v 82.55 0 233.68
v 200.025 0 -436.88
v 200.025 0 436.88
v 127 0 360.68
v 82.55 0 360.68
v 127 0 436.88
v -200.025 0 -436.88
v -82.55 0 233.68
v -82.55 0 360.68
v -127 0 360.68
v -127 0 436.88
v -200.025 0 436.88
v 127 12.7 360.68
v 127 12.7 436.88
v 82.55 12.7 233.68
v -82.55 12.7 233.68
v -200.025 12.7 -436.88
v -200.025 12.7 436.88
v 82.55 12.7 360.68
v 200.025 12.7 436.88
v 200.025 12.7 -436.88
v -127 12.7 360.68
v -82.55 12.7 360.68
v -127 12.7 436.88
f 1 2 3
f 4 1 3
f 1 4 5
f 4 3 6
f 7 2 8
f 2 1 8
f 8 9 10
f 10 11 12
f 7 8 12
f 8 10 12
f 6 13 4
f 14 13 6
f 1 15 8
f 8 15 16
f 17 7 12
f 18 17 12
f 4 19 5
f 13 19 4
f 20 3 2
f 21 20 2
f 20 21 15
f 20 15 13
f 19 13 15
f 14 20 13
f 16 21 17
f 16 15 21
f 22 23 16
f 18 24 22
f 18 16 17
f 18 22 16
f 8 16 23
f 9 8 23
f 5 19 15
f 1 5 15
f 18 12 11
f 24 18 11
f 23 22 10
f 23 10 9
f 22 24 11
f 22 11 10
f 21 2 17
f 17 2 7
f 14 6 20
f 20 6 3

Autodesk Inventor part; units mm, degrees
ref_plane "YZ Plane" through (0, 0, 0) normal (1, 0, 0) x (0, 1, 0)
ref_plane "XZ Plane" through (0, 0, 0) normal (0, 1, 0) x (-1, 0, 0)
ref_plane "XY Plane" through (0, 0, 0) normal (0, 0, 1) x (1, 0, 0)
sketch "Sketch1" plane through (0, 0, 0) normal (0, 1, 0) x (-1, 0, 0)
  line L0 (200.025, 436.88) -> (-200.025, 436.88)
  line L1 (-200.025, 436.88) -> (-200.025, -436.88)
  line L2 (-200.025, -436.88) -> (200.025, -436.88)
  line L3 (200.025, -436.88) -> (200.025, 436.88)
  line L4 (200.025, 436.88) -> (-200.025, -436.88) construction
  line L5 (-200.025, 436.88) -> (200.025, -436.88) construction
  point P0 (0, 0)
  dimension "d0" = 400.05
  dimension "d1" = 873.76
extrude "Extrusion1" add sketch "Sketch1" along normal blind 12.7
sketch "Sketch4" plane through (0, 12.7, 0) normal (0, 1, 0) x (1, 0, 0)
  line L0 (-82.55, -436.88) -> (82.55, -436.88)
  line L1 (82.55, -436.88) -> (82.55, -233.68)
  line L2 (82.55, -233.68) -> (-82.55, -233.68)
  line L3 (-82.55, -233.68) -> (-82.55, -436.88)
  line L4 (-82.55, -436.88) -> (82.55, -233.68) construction
  line L5 (82.55, -436.88) -> (-82.55, -233.68) construction
  line L6 (-200.025, -436.88) -> (200.025, -436.88) projected
  line L7 (-200.025, 436.88) -> (-200.025, -436.88) projected
  line L8 (200.025, -436.88) -> (200.025, 436.88) projected
  point P0 (0, 0)
  point P1 (0, -335.28)
  dimension "d11" = 0
  dimension "d12" = 165.1
  dimension "d13" = 203.2
  dimension "d19" = 117.475
  dimension "d20" = 117.475
extrude "Extrusion2" cut sketch "Sketch4" against normal through all
sketch "Sketch6" plane through (0, 12.7, 0) normal (0, 1, 0) x (1, 0, 0)
  line L0 (0, 0) -> (0, -436.88) construction
  line L1 (-127, -360.68) -> (127, -360.68)
  line L2 (127, -360.68) -> (127, -436.88)
  line L3 (127, -436.88) -> (-127, -436.88)
  line L4 (-127, -436.88) -> (-127, -360.68)
  line L5 (-127, -360.68) -> (127, -436.88) construction
  line L6 (127, -360.68) -> (-127, -436.88) construction
  line L7 (-200.025, -436.88) -> (-82.55, -436.88) projected
  point P0 (0, -398.78)
  dimension "d24" = 254
  dimension "d25" = 76.2
extrude "Extrusion4" cut sketch "Sketch6" against normal through all
properties part number "2020 Wood Base" material "Wood (Birch)"
